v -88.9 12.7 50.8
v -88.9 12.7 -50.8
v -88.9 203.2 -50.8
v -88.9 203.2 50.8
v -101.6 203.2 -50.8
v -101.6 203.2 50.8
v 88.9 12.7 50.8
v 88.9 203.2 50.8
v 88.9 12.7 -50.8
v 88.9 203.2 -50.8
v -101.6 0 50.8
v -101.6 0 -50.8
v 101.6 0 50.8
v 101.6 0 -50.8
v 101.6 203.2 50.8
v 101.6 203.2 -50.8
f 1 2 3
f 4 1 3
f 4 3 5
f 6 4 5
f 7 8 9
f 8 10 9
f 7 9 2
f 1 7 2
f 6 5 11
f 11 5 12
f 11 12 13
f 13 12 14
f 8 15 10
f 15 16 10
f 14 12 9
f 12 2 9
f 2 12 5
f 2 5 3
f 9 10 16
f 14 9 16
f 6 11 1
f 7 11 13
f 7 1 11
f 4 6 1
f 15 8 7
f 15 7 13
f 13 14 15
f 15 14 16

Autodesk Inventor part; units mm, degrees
ref_plane "XZ Plane" through (0, 0, 0) normal (0, 1, 0) x (-1, 0, 0)
ref_plane "XY Plane" through (0, 0, 0) normal (0, 0, 1) x (1, 0, 0)
sketch "Sketch3" plane through (0, 0, 0) normal (0, 0, 1) x (1, 0, 0)
  line L0 (0, 0) -> (0, 127) construction
  line L1 (0, 0) -> (101.6, 0)
  line L2 (101.6, 0) -> (101.6, 203.2)
  line L3 (101.6, 203.2) -> (88.9, 203.2)
  line L4 (88.9, 203.2) -> (88.9, 12.7)
  line L5 (88.9, 12.7) -> (0, 12.7)
  line L6 (0, 12.7) -> (0, 0)
  dimension "d2" = 127
  dimension "forkWallThickness" = 12.7
  dimension "oneHalfTubeDiameter" = 88.9
  dimension "baseMaterialWidth" = 12.7
  dimension "d6" = 203.2
extrude "Extrusion1" add sketch "Sketch3" along normal mid plane 101.6
mirror "Mirror1" about plane through (0, 0, 0) normal (1, 0, 0) of "Extrusion1"
properties part number "forkV01"
